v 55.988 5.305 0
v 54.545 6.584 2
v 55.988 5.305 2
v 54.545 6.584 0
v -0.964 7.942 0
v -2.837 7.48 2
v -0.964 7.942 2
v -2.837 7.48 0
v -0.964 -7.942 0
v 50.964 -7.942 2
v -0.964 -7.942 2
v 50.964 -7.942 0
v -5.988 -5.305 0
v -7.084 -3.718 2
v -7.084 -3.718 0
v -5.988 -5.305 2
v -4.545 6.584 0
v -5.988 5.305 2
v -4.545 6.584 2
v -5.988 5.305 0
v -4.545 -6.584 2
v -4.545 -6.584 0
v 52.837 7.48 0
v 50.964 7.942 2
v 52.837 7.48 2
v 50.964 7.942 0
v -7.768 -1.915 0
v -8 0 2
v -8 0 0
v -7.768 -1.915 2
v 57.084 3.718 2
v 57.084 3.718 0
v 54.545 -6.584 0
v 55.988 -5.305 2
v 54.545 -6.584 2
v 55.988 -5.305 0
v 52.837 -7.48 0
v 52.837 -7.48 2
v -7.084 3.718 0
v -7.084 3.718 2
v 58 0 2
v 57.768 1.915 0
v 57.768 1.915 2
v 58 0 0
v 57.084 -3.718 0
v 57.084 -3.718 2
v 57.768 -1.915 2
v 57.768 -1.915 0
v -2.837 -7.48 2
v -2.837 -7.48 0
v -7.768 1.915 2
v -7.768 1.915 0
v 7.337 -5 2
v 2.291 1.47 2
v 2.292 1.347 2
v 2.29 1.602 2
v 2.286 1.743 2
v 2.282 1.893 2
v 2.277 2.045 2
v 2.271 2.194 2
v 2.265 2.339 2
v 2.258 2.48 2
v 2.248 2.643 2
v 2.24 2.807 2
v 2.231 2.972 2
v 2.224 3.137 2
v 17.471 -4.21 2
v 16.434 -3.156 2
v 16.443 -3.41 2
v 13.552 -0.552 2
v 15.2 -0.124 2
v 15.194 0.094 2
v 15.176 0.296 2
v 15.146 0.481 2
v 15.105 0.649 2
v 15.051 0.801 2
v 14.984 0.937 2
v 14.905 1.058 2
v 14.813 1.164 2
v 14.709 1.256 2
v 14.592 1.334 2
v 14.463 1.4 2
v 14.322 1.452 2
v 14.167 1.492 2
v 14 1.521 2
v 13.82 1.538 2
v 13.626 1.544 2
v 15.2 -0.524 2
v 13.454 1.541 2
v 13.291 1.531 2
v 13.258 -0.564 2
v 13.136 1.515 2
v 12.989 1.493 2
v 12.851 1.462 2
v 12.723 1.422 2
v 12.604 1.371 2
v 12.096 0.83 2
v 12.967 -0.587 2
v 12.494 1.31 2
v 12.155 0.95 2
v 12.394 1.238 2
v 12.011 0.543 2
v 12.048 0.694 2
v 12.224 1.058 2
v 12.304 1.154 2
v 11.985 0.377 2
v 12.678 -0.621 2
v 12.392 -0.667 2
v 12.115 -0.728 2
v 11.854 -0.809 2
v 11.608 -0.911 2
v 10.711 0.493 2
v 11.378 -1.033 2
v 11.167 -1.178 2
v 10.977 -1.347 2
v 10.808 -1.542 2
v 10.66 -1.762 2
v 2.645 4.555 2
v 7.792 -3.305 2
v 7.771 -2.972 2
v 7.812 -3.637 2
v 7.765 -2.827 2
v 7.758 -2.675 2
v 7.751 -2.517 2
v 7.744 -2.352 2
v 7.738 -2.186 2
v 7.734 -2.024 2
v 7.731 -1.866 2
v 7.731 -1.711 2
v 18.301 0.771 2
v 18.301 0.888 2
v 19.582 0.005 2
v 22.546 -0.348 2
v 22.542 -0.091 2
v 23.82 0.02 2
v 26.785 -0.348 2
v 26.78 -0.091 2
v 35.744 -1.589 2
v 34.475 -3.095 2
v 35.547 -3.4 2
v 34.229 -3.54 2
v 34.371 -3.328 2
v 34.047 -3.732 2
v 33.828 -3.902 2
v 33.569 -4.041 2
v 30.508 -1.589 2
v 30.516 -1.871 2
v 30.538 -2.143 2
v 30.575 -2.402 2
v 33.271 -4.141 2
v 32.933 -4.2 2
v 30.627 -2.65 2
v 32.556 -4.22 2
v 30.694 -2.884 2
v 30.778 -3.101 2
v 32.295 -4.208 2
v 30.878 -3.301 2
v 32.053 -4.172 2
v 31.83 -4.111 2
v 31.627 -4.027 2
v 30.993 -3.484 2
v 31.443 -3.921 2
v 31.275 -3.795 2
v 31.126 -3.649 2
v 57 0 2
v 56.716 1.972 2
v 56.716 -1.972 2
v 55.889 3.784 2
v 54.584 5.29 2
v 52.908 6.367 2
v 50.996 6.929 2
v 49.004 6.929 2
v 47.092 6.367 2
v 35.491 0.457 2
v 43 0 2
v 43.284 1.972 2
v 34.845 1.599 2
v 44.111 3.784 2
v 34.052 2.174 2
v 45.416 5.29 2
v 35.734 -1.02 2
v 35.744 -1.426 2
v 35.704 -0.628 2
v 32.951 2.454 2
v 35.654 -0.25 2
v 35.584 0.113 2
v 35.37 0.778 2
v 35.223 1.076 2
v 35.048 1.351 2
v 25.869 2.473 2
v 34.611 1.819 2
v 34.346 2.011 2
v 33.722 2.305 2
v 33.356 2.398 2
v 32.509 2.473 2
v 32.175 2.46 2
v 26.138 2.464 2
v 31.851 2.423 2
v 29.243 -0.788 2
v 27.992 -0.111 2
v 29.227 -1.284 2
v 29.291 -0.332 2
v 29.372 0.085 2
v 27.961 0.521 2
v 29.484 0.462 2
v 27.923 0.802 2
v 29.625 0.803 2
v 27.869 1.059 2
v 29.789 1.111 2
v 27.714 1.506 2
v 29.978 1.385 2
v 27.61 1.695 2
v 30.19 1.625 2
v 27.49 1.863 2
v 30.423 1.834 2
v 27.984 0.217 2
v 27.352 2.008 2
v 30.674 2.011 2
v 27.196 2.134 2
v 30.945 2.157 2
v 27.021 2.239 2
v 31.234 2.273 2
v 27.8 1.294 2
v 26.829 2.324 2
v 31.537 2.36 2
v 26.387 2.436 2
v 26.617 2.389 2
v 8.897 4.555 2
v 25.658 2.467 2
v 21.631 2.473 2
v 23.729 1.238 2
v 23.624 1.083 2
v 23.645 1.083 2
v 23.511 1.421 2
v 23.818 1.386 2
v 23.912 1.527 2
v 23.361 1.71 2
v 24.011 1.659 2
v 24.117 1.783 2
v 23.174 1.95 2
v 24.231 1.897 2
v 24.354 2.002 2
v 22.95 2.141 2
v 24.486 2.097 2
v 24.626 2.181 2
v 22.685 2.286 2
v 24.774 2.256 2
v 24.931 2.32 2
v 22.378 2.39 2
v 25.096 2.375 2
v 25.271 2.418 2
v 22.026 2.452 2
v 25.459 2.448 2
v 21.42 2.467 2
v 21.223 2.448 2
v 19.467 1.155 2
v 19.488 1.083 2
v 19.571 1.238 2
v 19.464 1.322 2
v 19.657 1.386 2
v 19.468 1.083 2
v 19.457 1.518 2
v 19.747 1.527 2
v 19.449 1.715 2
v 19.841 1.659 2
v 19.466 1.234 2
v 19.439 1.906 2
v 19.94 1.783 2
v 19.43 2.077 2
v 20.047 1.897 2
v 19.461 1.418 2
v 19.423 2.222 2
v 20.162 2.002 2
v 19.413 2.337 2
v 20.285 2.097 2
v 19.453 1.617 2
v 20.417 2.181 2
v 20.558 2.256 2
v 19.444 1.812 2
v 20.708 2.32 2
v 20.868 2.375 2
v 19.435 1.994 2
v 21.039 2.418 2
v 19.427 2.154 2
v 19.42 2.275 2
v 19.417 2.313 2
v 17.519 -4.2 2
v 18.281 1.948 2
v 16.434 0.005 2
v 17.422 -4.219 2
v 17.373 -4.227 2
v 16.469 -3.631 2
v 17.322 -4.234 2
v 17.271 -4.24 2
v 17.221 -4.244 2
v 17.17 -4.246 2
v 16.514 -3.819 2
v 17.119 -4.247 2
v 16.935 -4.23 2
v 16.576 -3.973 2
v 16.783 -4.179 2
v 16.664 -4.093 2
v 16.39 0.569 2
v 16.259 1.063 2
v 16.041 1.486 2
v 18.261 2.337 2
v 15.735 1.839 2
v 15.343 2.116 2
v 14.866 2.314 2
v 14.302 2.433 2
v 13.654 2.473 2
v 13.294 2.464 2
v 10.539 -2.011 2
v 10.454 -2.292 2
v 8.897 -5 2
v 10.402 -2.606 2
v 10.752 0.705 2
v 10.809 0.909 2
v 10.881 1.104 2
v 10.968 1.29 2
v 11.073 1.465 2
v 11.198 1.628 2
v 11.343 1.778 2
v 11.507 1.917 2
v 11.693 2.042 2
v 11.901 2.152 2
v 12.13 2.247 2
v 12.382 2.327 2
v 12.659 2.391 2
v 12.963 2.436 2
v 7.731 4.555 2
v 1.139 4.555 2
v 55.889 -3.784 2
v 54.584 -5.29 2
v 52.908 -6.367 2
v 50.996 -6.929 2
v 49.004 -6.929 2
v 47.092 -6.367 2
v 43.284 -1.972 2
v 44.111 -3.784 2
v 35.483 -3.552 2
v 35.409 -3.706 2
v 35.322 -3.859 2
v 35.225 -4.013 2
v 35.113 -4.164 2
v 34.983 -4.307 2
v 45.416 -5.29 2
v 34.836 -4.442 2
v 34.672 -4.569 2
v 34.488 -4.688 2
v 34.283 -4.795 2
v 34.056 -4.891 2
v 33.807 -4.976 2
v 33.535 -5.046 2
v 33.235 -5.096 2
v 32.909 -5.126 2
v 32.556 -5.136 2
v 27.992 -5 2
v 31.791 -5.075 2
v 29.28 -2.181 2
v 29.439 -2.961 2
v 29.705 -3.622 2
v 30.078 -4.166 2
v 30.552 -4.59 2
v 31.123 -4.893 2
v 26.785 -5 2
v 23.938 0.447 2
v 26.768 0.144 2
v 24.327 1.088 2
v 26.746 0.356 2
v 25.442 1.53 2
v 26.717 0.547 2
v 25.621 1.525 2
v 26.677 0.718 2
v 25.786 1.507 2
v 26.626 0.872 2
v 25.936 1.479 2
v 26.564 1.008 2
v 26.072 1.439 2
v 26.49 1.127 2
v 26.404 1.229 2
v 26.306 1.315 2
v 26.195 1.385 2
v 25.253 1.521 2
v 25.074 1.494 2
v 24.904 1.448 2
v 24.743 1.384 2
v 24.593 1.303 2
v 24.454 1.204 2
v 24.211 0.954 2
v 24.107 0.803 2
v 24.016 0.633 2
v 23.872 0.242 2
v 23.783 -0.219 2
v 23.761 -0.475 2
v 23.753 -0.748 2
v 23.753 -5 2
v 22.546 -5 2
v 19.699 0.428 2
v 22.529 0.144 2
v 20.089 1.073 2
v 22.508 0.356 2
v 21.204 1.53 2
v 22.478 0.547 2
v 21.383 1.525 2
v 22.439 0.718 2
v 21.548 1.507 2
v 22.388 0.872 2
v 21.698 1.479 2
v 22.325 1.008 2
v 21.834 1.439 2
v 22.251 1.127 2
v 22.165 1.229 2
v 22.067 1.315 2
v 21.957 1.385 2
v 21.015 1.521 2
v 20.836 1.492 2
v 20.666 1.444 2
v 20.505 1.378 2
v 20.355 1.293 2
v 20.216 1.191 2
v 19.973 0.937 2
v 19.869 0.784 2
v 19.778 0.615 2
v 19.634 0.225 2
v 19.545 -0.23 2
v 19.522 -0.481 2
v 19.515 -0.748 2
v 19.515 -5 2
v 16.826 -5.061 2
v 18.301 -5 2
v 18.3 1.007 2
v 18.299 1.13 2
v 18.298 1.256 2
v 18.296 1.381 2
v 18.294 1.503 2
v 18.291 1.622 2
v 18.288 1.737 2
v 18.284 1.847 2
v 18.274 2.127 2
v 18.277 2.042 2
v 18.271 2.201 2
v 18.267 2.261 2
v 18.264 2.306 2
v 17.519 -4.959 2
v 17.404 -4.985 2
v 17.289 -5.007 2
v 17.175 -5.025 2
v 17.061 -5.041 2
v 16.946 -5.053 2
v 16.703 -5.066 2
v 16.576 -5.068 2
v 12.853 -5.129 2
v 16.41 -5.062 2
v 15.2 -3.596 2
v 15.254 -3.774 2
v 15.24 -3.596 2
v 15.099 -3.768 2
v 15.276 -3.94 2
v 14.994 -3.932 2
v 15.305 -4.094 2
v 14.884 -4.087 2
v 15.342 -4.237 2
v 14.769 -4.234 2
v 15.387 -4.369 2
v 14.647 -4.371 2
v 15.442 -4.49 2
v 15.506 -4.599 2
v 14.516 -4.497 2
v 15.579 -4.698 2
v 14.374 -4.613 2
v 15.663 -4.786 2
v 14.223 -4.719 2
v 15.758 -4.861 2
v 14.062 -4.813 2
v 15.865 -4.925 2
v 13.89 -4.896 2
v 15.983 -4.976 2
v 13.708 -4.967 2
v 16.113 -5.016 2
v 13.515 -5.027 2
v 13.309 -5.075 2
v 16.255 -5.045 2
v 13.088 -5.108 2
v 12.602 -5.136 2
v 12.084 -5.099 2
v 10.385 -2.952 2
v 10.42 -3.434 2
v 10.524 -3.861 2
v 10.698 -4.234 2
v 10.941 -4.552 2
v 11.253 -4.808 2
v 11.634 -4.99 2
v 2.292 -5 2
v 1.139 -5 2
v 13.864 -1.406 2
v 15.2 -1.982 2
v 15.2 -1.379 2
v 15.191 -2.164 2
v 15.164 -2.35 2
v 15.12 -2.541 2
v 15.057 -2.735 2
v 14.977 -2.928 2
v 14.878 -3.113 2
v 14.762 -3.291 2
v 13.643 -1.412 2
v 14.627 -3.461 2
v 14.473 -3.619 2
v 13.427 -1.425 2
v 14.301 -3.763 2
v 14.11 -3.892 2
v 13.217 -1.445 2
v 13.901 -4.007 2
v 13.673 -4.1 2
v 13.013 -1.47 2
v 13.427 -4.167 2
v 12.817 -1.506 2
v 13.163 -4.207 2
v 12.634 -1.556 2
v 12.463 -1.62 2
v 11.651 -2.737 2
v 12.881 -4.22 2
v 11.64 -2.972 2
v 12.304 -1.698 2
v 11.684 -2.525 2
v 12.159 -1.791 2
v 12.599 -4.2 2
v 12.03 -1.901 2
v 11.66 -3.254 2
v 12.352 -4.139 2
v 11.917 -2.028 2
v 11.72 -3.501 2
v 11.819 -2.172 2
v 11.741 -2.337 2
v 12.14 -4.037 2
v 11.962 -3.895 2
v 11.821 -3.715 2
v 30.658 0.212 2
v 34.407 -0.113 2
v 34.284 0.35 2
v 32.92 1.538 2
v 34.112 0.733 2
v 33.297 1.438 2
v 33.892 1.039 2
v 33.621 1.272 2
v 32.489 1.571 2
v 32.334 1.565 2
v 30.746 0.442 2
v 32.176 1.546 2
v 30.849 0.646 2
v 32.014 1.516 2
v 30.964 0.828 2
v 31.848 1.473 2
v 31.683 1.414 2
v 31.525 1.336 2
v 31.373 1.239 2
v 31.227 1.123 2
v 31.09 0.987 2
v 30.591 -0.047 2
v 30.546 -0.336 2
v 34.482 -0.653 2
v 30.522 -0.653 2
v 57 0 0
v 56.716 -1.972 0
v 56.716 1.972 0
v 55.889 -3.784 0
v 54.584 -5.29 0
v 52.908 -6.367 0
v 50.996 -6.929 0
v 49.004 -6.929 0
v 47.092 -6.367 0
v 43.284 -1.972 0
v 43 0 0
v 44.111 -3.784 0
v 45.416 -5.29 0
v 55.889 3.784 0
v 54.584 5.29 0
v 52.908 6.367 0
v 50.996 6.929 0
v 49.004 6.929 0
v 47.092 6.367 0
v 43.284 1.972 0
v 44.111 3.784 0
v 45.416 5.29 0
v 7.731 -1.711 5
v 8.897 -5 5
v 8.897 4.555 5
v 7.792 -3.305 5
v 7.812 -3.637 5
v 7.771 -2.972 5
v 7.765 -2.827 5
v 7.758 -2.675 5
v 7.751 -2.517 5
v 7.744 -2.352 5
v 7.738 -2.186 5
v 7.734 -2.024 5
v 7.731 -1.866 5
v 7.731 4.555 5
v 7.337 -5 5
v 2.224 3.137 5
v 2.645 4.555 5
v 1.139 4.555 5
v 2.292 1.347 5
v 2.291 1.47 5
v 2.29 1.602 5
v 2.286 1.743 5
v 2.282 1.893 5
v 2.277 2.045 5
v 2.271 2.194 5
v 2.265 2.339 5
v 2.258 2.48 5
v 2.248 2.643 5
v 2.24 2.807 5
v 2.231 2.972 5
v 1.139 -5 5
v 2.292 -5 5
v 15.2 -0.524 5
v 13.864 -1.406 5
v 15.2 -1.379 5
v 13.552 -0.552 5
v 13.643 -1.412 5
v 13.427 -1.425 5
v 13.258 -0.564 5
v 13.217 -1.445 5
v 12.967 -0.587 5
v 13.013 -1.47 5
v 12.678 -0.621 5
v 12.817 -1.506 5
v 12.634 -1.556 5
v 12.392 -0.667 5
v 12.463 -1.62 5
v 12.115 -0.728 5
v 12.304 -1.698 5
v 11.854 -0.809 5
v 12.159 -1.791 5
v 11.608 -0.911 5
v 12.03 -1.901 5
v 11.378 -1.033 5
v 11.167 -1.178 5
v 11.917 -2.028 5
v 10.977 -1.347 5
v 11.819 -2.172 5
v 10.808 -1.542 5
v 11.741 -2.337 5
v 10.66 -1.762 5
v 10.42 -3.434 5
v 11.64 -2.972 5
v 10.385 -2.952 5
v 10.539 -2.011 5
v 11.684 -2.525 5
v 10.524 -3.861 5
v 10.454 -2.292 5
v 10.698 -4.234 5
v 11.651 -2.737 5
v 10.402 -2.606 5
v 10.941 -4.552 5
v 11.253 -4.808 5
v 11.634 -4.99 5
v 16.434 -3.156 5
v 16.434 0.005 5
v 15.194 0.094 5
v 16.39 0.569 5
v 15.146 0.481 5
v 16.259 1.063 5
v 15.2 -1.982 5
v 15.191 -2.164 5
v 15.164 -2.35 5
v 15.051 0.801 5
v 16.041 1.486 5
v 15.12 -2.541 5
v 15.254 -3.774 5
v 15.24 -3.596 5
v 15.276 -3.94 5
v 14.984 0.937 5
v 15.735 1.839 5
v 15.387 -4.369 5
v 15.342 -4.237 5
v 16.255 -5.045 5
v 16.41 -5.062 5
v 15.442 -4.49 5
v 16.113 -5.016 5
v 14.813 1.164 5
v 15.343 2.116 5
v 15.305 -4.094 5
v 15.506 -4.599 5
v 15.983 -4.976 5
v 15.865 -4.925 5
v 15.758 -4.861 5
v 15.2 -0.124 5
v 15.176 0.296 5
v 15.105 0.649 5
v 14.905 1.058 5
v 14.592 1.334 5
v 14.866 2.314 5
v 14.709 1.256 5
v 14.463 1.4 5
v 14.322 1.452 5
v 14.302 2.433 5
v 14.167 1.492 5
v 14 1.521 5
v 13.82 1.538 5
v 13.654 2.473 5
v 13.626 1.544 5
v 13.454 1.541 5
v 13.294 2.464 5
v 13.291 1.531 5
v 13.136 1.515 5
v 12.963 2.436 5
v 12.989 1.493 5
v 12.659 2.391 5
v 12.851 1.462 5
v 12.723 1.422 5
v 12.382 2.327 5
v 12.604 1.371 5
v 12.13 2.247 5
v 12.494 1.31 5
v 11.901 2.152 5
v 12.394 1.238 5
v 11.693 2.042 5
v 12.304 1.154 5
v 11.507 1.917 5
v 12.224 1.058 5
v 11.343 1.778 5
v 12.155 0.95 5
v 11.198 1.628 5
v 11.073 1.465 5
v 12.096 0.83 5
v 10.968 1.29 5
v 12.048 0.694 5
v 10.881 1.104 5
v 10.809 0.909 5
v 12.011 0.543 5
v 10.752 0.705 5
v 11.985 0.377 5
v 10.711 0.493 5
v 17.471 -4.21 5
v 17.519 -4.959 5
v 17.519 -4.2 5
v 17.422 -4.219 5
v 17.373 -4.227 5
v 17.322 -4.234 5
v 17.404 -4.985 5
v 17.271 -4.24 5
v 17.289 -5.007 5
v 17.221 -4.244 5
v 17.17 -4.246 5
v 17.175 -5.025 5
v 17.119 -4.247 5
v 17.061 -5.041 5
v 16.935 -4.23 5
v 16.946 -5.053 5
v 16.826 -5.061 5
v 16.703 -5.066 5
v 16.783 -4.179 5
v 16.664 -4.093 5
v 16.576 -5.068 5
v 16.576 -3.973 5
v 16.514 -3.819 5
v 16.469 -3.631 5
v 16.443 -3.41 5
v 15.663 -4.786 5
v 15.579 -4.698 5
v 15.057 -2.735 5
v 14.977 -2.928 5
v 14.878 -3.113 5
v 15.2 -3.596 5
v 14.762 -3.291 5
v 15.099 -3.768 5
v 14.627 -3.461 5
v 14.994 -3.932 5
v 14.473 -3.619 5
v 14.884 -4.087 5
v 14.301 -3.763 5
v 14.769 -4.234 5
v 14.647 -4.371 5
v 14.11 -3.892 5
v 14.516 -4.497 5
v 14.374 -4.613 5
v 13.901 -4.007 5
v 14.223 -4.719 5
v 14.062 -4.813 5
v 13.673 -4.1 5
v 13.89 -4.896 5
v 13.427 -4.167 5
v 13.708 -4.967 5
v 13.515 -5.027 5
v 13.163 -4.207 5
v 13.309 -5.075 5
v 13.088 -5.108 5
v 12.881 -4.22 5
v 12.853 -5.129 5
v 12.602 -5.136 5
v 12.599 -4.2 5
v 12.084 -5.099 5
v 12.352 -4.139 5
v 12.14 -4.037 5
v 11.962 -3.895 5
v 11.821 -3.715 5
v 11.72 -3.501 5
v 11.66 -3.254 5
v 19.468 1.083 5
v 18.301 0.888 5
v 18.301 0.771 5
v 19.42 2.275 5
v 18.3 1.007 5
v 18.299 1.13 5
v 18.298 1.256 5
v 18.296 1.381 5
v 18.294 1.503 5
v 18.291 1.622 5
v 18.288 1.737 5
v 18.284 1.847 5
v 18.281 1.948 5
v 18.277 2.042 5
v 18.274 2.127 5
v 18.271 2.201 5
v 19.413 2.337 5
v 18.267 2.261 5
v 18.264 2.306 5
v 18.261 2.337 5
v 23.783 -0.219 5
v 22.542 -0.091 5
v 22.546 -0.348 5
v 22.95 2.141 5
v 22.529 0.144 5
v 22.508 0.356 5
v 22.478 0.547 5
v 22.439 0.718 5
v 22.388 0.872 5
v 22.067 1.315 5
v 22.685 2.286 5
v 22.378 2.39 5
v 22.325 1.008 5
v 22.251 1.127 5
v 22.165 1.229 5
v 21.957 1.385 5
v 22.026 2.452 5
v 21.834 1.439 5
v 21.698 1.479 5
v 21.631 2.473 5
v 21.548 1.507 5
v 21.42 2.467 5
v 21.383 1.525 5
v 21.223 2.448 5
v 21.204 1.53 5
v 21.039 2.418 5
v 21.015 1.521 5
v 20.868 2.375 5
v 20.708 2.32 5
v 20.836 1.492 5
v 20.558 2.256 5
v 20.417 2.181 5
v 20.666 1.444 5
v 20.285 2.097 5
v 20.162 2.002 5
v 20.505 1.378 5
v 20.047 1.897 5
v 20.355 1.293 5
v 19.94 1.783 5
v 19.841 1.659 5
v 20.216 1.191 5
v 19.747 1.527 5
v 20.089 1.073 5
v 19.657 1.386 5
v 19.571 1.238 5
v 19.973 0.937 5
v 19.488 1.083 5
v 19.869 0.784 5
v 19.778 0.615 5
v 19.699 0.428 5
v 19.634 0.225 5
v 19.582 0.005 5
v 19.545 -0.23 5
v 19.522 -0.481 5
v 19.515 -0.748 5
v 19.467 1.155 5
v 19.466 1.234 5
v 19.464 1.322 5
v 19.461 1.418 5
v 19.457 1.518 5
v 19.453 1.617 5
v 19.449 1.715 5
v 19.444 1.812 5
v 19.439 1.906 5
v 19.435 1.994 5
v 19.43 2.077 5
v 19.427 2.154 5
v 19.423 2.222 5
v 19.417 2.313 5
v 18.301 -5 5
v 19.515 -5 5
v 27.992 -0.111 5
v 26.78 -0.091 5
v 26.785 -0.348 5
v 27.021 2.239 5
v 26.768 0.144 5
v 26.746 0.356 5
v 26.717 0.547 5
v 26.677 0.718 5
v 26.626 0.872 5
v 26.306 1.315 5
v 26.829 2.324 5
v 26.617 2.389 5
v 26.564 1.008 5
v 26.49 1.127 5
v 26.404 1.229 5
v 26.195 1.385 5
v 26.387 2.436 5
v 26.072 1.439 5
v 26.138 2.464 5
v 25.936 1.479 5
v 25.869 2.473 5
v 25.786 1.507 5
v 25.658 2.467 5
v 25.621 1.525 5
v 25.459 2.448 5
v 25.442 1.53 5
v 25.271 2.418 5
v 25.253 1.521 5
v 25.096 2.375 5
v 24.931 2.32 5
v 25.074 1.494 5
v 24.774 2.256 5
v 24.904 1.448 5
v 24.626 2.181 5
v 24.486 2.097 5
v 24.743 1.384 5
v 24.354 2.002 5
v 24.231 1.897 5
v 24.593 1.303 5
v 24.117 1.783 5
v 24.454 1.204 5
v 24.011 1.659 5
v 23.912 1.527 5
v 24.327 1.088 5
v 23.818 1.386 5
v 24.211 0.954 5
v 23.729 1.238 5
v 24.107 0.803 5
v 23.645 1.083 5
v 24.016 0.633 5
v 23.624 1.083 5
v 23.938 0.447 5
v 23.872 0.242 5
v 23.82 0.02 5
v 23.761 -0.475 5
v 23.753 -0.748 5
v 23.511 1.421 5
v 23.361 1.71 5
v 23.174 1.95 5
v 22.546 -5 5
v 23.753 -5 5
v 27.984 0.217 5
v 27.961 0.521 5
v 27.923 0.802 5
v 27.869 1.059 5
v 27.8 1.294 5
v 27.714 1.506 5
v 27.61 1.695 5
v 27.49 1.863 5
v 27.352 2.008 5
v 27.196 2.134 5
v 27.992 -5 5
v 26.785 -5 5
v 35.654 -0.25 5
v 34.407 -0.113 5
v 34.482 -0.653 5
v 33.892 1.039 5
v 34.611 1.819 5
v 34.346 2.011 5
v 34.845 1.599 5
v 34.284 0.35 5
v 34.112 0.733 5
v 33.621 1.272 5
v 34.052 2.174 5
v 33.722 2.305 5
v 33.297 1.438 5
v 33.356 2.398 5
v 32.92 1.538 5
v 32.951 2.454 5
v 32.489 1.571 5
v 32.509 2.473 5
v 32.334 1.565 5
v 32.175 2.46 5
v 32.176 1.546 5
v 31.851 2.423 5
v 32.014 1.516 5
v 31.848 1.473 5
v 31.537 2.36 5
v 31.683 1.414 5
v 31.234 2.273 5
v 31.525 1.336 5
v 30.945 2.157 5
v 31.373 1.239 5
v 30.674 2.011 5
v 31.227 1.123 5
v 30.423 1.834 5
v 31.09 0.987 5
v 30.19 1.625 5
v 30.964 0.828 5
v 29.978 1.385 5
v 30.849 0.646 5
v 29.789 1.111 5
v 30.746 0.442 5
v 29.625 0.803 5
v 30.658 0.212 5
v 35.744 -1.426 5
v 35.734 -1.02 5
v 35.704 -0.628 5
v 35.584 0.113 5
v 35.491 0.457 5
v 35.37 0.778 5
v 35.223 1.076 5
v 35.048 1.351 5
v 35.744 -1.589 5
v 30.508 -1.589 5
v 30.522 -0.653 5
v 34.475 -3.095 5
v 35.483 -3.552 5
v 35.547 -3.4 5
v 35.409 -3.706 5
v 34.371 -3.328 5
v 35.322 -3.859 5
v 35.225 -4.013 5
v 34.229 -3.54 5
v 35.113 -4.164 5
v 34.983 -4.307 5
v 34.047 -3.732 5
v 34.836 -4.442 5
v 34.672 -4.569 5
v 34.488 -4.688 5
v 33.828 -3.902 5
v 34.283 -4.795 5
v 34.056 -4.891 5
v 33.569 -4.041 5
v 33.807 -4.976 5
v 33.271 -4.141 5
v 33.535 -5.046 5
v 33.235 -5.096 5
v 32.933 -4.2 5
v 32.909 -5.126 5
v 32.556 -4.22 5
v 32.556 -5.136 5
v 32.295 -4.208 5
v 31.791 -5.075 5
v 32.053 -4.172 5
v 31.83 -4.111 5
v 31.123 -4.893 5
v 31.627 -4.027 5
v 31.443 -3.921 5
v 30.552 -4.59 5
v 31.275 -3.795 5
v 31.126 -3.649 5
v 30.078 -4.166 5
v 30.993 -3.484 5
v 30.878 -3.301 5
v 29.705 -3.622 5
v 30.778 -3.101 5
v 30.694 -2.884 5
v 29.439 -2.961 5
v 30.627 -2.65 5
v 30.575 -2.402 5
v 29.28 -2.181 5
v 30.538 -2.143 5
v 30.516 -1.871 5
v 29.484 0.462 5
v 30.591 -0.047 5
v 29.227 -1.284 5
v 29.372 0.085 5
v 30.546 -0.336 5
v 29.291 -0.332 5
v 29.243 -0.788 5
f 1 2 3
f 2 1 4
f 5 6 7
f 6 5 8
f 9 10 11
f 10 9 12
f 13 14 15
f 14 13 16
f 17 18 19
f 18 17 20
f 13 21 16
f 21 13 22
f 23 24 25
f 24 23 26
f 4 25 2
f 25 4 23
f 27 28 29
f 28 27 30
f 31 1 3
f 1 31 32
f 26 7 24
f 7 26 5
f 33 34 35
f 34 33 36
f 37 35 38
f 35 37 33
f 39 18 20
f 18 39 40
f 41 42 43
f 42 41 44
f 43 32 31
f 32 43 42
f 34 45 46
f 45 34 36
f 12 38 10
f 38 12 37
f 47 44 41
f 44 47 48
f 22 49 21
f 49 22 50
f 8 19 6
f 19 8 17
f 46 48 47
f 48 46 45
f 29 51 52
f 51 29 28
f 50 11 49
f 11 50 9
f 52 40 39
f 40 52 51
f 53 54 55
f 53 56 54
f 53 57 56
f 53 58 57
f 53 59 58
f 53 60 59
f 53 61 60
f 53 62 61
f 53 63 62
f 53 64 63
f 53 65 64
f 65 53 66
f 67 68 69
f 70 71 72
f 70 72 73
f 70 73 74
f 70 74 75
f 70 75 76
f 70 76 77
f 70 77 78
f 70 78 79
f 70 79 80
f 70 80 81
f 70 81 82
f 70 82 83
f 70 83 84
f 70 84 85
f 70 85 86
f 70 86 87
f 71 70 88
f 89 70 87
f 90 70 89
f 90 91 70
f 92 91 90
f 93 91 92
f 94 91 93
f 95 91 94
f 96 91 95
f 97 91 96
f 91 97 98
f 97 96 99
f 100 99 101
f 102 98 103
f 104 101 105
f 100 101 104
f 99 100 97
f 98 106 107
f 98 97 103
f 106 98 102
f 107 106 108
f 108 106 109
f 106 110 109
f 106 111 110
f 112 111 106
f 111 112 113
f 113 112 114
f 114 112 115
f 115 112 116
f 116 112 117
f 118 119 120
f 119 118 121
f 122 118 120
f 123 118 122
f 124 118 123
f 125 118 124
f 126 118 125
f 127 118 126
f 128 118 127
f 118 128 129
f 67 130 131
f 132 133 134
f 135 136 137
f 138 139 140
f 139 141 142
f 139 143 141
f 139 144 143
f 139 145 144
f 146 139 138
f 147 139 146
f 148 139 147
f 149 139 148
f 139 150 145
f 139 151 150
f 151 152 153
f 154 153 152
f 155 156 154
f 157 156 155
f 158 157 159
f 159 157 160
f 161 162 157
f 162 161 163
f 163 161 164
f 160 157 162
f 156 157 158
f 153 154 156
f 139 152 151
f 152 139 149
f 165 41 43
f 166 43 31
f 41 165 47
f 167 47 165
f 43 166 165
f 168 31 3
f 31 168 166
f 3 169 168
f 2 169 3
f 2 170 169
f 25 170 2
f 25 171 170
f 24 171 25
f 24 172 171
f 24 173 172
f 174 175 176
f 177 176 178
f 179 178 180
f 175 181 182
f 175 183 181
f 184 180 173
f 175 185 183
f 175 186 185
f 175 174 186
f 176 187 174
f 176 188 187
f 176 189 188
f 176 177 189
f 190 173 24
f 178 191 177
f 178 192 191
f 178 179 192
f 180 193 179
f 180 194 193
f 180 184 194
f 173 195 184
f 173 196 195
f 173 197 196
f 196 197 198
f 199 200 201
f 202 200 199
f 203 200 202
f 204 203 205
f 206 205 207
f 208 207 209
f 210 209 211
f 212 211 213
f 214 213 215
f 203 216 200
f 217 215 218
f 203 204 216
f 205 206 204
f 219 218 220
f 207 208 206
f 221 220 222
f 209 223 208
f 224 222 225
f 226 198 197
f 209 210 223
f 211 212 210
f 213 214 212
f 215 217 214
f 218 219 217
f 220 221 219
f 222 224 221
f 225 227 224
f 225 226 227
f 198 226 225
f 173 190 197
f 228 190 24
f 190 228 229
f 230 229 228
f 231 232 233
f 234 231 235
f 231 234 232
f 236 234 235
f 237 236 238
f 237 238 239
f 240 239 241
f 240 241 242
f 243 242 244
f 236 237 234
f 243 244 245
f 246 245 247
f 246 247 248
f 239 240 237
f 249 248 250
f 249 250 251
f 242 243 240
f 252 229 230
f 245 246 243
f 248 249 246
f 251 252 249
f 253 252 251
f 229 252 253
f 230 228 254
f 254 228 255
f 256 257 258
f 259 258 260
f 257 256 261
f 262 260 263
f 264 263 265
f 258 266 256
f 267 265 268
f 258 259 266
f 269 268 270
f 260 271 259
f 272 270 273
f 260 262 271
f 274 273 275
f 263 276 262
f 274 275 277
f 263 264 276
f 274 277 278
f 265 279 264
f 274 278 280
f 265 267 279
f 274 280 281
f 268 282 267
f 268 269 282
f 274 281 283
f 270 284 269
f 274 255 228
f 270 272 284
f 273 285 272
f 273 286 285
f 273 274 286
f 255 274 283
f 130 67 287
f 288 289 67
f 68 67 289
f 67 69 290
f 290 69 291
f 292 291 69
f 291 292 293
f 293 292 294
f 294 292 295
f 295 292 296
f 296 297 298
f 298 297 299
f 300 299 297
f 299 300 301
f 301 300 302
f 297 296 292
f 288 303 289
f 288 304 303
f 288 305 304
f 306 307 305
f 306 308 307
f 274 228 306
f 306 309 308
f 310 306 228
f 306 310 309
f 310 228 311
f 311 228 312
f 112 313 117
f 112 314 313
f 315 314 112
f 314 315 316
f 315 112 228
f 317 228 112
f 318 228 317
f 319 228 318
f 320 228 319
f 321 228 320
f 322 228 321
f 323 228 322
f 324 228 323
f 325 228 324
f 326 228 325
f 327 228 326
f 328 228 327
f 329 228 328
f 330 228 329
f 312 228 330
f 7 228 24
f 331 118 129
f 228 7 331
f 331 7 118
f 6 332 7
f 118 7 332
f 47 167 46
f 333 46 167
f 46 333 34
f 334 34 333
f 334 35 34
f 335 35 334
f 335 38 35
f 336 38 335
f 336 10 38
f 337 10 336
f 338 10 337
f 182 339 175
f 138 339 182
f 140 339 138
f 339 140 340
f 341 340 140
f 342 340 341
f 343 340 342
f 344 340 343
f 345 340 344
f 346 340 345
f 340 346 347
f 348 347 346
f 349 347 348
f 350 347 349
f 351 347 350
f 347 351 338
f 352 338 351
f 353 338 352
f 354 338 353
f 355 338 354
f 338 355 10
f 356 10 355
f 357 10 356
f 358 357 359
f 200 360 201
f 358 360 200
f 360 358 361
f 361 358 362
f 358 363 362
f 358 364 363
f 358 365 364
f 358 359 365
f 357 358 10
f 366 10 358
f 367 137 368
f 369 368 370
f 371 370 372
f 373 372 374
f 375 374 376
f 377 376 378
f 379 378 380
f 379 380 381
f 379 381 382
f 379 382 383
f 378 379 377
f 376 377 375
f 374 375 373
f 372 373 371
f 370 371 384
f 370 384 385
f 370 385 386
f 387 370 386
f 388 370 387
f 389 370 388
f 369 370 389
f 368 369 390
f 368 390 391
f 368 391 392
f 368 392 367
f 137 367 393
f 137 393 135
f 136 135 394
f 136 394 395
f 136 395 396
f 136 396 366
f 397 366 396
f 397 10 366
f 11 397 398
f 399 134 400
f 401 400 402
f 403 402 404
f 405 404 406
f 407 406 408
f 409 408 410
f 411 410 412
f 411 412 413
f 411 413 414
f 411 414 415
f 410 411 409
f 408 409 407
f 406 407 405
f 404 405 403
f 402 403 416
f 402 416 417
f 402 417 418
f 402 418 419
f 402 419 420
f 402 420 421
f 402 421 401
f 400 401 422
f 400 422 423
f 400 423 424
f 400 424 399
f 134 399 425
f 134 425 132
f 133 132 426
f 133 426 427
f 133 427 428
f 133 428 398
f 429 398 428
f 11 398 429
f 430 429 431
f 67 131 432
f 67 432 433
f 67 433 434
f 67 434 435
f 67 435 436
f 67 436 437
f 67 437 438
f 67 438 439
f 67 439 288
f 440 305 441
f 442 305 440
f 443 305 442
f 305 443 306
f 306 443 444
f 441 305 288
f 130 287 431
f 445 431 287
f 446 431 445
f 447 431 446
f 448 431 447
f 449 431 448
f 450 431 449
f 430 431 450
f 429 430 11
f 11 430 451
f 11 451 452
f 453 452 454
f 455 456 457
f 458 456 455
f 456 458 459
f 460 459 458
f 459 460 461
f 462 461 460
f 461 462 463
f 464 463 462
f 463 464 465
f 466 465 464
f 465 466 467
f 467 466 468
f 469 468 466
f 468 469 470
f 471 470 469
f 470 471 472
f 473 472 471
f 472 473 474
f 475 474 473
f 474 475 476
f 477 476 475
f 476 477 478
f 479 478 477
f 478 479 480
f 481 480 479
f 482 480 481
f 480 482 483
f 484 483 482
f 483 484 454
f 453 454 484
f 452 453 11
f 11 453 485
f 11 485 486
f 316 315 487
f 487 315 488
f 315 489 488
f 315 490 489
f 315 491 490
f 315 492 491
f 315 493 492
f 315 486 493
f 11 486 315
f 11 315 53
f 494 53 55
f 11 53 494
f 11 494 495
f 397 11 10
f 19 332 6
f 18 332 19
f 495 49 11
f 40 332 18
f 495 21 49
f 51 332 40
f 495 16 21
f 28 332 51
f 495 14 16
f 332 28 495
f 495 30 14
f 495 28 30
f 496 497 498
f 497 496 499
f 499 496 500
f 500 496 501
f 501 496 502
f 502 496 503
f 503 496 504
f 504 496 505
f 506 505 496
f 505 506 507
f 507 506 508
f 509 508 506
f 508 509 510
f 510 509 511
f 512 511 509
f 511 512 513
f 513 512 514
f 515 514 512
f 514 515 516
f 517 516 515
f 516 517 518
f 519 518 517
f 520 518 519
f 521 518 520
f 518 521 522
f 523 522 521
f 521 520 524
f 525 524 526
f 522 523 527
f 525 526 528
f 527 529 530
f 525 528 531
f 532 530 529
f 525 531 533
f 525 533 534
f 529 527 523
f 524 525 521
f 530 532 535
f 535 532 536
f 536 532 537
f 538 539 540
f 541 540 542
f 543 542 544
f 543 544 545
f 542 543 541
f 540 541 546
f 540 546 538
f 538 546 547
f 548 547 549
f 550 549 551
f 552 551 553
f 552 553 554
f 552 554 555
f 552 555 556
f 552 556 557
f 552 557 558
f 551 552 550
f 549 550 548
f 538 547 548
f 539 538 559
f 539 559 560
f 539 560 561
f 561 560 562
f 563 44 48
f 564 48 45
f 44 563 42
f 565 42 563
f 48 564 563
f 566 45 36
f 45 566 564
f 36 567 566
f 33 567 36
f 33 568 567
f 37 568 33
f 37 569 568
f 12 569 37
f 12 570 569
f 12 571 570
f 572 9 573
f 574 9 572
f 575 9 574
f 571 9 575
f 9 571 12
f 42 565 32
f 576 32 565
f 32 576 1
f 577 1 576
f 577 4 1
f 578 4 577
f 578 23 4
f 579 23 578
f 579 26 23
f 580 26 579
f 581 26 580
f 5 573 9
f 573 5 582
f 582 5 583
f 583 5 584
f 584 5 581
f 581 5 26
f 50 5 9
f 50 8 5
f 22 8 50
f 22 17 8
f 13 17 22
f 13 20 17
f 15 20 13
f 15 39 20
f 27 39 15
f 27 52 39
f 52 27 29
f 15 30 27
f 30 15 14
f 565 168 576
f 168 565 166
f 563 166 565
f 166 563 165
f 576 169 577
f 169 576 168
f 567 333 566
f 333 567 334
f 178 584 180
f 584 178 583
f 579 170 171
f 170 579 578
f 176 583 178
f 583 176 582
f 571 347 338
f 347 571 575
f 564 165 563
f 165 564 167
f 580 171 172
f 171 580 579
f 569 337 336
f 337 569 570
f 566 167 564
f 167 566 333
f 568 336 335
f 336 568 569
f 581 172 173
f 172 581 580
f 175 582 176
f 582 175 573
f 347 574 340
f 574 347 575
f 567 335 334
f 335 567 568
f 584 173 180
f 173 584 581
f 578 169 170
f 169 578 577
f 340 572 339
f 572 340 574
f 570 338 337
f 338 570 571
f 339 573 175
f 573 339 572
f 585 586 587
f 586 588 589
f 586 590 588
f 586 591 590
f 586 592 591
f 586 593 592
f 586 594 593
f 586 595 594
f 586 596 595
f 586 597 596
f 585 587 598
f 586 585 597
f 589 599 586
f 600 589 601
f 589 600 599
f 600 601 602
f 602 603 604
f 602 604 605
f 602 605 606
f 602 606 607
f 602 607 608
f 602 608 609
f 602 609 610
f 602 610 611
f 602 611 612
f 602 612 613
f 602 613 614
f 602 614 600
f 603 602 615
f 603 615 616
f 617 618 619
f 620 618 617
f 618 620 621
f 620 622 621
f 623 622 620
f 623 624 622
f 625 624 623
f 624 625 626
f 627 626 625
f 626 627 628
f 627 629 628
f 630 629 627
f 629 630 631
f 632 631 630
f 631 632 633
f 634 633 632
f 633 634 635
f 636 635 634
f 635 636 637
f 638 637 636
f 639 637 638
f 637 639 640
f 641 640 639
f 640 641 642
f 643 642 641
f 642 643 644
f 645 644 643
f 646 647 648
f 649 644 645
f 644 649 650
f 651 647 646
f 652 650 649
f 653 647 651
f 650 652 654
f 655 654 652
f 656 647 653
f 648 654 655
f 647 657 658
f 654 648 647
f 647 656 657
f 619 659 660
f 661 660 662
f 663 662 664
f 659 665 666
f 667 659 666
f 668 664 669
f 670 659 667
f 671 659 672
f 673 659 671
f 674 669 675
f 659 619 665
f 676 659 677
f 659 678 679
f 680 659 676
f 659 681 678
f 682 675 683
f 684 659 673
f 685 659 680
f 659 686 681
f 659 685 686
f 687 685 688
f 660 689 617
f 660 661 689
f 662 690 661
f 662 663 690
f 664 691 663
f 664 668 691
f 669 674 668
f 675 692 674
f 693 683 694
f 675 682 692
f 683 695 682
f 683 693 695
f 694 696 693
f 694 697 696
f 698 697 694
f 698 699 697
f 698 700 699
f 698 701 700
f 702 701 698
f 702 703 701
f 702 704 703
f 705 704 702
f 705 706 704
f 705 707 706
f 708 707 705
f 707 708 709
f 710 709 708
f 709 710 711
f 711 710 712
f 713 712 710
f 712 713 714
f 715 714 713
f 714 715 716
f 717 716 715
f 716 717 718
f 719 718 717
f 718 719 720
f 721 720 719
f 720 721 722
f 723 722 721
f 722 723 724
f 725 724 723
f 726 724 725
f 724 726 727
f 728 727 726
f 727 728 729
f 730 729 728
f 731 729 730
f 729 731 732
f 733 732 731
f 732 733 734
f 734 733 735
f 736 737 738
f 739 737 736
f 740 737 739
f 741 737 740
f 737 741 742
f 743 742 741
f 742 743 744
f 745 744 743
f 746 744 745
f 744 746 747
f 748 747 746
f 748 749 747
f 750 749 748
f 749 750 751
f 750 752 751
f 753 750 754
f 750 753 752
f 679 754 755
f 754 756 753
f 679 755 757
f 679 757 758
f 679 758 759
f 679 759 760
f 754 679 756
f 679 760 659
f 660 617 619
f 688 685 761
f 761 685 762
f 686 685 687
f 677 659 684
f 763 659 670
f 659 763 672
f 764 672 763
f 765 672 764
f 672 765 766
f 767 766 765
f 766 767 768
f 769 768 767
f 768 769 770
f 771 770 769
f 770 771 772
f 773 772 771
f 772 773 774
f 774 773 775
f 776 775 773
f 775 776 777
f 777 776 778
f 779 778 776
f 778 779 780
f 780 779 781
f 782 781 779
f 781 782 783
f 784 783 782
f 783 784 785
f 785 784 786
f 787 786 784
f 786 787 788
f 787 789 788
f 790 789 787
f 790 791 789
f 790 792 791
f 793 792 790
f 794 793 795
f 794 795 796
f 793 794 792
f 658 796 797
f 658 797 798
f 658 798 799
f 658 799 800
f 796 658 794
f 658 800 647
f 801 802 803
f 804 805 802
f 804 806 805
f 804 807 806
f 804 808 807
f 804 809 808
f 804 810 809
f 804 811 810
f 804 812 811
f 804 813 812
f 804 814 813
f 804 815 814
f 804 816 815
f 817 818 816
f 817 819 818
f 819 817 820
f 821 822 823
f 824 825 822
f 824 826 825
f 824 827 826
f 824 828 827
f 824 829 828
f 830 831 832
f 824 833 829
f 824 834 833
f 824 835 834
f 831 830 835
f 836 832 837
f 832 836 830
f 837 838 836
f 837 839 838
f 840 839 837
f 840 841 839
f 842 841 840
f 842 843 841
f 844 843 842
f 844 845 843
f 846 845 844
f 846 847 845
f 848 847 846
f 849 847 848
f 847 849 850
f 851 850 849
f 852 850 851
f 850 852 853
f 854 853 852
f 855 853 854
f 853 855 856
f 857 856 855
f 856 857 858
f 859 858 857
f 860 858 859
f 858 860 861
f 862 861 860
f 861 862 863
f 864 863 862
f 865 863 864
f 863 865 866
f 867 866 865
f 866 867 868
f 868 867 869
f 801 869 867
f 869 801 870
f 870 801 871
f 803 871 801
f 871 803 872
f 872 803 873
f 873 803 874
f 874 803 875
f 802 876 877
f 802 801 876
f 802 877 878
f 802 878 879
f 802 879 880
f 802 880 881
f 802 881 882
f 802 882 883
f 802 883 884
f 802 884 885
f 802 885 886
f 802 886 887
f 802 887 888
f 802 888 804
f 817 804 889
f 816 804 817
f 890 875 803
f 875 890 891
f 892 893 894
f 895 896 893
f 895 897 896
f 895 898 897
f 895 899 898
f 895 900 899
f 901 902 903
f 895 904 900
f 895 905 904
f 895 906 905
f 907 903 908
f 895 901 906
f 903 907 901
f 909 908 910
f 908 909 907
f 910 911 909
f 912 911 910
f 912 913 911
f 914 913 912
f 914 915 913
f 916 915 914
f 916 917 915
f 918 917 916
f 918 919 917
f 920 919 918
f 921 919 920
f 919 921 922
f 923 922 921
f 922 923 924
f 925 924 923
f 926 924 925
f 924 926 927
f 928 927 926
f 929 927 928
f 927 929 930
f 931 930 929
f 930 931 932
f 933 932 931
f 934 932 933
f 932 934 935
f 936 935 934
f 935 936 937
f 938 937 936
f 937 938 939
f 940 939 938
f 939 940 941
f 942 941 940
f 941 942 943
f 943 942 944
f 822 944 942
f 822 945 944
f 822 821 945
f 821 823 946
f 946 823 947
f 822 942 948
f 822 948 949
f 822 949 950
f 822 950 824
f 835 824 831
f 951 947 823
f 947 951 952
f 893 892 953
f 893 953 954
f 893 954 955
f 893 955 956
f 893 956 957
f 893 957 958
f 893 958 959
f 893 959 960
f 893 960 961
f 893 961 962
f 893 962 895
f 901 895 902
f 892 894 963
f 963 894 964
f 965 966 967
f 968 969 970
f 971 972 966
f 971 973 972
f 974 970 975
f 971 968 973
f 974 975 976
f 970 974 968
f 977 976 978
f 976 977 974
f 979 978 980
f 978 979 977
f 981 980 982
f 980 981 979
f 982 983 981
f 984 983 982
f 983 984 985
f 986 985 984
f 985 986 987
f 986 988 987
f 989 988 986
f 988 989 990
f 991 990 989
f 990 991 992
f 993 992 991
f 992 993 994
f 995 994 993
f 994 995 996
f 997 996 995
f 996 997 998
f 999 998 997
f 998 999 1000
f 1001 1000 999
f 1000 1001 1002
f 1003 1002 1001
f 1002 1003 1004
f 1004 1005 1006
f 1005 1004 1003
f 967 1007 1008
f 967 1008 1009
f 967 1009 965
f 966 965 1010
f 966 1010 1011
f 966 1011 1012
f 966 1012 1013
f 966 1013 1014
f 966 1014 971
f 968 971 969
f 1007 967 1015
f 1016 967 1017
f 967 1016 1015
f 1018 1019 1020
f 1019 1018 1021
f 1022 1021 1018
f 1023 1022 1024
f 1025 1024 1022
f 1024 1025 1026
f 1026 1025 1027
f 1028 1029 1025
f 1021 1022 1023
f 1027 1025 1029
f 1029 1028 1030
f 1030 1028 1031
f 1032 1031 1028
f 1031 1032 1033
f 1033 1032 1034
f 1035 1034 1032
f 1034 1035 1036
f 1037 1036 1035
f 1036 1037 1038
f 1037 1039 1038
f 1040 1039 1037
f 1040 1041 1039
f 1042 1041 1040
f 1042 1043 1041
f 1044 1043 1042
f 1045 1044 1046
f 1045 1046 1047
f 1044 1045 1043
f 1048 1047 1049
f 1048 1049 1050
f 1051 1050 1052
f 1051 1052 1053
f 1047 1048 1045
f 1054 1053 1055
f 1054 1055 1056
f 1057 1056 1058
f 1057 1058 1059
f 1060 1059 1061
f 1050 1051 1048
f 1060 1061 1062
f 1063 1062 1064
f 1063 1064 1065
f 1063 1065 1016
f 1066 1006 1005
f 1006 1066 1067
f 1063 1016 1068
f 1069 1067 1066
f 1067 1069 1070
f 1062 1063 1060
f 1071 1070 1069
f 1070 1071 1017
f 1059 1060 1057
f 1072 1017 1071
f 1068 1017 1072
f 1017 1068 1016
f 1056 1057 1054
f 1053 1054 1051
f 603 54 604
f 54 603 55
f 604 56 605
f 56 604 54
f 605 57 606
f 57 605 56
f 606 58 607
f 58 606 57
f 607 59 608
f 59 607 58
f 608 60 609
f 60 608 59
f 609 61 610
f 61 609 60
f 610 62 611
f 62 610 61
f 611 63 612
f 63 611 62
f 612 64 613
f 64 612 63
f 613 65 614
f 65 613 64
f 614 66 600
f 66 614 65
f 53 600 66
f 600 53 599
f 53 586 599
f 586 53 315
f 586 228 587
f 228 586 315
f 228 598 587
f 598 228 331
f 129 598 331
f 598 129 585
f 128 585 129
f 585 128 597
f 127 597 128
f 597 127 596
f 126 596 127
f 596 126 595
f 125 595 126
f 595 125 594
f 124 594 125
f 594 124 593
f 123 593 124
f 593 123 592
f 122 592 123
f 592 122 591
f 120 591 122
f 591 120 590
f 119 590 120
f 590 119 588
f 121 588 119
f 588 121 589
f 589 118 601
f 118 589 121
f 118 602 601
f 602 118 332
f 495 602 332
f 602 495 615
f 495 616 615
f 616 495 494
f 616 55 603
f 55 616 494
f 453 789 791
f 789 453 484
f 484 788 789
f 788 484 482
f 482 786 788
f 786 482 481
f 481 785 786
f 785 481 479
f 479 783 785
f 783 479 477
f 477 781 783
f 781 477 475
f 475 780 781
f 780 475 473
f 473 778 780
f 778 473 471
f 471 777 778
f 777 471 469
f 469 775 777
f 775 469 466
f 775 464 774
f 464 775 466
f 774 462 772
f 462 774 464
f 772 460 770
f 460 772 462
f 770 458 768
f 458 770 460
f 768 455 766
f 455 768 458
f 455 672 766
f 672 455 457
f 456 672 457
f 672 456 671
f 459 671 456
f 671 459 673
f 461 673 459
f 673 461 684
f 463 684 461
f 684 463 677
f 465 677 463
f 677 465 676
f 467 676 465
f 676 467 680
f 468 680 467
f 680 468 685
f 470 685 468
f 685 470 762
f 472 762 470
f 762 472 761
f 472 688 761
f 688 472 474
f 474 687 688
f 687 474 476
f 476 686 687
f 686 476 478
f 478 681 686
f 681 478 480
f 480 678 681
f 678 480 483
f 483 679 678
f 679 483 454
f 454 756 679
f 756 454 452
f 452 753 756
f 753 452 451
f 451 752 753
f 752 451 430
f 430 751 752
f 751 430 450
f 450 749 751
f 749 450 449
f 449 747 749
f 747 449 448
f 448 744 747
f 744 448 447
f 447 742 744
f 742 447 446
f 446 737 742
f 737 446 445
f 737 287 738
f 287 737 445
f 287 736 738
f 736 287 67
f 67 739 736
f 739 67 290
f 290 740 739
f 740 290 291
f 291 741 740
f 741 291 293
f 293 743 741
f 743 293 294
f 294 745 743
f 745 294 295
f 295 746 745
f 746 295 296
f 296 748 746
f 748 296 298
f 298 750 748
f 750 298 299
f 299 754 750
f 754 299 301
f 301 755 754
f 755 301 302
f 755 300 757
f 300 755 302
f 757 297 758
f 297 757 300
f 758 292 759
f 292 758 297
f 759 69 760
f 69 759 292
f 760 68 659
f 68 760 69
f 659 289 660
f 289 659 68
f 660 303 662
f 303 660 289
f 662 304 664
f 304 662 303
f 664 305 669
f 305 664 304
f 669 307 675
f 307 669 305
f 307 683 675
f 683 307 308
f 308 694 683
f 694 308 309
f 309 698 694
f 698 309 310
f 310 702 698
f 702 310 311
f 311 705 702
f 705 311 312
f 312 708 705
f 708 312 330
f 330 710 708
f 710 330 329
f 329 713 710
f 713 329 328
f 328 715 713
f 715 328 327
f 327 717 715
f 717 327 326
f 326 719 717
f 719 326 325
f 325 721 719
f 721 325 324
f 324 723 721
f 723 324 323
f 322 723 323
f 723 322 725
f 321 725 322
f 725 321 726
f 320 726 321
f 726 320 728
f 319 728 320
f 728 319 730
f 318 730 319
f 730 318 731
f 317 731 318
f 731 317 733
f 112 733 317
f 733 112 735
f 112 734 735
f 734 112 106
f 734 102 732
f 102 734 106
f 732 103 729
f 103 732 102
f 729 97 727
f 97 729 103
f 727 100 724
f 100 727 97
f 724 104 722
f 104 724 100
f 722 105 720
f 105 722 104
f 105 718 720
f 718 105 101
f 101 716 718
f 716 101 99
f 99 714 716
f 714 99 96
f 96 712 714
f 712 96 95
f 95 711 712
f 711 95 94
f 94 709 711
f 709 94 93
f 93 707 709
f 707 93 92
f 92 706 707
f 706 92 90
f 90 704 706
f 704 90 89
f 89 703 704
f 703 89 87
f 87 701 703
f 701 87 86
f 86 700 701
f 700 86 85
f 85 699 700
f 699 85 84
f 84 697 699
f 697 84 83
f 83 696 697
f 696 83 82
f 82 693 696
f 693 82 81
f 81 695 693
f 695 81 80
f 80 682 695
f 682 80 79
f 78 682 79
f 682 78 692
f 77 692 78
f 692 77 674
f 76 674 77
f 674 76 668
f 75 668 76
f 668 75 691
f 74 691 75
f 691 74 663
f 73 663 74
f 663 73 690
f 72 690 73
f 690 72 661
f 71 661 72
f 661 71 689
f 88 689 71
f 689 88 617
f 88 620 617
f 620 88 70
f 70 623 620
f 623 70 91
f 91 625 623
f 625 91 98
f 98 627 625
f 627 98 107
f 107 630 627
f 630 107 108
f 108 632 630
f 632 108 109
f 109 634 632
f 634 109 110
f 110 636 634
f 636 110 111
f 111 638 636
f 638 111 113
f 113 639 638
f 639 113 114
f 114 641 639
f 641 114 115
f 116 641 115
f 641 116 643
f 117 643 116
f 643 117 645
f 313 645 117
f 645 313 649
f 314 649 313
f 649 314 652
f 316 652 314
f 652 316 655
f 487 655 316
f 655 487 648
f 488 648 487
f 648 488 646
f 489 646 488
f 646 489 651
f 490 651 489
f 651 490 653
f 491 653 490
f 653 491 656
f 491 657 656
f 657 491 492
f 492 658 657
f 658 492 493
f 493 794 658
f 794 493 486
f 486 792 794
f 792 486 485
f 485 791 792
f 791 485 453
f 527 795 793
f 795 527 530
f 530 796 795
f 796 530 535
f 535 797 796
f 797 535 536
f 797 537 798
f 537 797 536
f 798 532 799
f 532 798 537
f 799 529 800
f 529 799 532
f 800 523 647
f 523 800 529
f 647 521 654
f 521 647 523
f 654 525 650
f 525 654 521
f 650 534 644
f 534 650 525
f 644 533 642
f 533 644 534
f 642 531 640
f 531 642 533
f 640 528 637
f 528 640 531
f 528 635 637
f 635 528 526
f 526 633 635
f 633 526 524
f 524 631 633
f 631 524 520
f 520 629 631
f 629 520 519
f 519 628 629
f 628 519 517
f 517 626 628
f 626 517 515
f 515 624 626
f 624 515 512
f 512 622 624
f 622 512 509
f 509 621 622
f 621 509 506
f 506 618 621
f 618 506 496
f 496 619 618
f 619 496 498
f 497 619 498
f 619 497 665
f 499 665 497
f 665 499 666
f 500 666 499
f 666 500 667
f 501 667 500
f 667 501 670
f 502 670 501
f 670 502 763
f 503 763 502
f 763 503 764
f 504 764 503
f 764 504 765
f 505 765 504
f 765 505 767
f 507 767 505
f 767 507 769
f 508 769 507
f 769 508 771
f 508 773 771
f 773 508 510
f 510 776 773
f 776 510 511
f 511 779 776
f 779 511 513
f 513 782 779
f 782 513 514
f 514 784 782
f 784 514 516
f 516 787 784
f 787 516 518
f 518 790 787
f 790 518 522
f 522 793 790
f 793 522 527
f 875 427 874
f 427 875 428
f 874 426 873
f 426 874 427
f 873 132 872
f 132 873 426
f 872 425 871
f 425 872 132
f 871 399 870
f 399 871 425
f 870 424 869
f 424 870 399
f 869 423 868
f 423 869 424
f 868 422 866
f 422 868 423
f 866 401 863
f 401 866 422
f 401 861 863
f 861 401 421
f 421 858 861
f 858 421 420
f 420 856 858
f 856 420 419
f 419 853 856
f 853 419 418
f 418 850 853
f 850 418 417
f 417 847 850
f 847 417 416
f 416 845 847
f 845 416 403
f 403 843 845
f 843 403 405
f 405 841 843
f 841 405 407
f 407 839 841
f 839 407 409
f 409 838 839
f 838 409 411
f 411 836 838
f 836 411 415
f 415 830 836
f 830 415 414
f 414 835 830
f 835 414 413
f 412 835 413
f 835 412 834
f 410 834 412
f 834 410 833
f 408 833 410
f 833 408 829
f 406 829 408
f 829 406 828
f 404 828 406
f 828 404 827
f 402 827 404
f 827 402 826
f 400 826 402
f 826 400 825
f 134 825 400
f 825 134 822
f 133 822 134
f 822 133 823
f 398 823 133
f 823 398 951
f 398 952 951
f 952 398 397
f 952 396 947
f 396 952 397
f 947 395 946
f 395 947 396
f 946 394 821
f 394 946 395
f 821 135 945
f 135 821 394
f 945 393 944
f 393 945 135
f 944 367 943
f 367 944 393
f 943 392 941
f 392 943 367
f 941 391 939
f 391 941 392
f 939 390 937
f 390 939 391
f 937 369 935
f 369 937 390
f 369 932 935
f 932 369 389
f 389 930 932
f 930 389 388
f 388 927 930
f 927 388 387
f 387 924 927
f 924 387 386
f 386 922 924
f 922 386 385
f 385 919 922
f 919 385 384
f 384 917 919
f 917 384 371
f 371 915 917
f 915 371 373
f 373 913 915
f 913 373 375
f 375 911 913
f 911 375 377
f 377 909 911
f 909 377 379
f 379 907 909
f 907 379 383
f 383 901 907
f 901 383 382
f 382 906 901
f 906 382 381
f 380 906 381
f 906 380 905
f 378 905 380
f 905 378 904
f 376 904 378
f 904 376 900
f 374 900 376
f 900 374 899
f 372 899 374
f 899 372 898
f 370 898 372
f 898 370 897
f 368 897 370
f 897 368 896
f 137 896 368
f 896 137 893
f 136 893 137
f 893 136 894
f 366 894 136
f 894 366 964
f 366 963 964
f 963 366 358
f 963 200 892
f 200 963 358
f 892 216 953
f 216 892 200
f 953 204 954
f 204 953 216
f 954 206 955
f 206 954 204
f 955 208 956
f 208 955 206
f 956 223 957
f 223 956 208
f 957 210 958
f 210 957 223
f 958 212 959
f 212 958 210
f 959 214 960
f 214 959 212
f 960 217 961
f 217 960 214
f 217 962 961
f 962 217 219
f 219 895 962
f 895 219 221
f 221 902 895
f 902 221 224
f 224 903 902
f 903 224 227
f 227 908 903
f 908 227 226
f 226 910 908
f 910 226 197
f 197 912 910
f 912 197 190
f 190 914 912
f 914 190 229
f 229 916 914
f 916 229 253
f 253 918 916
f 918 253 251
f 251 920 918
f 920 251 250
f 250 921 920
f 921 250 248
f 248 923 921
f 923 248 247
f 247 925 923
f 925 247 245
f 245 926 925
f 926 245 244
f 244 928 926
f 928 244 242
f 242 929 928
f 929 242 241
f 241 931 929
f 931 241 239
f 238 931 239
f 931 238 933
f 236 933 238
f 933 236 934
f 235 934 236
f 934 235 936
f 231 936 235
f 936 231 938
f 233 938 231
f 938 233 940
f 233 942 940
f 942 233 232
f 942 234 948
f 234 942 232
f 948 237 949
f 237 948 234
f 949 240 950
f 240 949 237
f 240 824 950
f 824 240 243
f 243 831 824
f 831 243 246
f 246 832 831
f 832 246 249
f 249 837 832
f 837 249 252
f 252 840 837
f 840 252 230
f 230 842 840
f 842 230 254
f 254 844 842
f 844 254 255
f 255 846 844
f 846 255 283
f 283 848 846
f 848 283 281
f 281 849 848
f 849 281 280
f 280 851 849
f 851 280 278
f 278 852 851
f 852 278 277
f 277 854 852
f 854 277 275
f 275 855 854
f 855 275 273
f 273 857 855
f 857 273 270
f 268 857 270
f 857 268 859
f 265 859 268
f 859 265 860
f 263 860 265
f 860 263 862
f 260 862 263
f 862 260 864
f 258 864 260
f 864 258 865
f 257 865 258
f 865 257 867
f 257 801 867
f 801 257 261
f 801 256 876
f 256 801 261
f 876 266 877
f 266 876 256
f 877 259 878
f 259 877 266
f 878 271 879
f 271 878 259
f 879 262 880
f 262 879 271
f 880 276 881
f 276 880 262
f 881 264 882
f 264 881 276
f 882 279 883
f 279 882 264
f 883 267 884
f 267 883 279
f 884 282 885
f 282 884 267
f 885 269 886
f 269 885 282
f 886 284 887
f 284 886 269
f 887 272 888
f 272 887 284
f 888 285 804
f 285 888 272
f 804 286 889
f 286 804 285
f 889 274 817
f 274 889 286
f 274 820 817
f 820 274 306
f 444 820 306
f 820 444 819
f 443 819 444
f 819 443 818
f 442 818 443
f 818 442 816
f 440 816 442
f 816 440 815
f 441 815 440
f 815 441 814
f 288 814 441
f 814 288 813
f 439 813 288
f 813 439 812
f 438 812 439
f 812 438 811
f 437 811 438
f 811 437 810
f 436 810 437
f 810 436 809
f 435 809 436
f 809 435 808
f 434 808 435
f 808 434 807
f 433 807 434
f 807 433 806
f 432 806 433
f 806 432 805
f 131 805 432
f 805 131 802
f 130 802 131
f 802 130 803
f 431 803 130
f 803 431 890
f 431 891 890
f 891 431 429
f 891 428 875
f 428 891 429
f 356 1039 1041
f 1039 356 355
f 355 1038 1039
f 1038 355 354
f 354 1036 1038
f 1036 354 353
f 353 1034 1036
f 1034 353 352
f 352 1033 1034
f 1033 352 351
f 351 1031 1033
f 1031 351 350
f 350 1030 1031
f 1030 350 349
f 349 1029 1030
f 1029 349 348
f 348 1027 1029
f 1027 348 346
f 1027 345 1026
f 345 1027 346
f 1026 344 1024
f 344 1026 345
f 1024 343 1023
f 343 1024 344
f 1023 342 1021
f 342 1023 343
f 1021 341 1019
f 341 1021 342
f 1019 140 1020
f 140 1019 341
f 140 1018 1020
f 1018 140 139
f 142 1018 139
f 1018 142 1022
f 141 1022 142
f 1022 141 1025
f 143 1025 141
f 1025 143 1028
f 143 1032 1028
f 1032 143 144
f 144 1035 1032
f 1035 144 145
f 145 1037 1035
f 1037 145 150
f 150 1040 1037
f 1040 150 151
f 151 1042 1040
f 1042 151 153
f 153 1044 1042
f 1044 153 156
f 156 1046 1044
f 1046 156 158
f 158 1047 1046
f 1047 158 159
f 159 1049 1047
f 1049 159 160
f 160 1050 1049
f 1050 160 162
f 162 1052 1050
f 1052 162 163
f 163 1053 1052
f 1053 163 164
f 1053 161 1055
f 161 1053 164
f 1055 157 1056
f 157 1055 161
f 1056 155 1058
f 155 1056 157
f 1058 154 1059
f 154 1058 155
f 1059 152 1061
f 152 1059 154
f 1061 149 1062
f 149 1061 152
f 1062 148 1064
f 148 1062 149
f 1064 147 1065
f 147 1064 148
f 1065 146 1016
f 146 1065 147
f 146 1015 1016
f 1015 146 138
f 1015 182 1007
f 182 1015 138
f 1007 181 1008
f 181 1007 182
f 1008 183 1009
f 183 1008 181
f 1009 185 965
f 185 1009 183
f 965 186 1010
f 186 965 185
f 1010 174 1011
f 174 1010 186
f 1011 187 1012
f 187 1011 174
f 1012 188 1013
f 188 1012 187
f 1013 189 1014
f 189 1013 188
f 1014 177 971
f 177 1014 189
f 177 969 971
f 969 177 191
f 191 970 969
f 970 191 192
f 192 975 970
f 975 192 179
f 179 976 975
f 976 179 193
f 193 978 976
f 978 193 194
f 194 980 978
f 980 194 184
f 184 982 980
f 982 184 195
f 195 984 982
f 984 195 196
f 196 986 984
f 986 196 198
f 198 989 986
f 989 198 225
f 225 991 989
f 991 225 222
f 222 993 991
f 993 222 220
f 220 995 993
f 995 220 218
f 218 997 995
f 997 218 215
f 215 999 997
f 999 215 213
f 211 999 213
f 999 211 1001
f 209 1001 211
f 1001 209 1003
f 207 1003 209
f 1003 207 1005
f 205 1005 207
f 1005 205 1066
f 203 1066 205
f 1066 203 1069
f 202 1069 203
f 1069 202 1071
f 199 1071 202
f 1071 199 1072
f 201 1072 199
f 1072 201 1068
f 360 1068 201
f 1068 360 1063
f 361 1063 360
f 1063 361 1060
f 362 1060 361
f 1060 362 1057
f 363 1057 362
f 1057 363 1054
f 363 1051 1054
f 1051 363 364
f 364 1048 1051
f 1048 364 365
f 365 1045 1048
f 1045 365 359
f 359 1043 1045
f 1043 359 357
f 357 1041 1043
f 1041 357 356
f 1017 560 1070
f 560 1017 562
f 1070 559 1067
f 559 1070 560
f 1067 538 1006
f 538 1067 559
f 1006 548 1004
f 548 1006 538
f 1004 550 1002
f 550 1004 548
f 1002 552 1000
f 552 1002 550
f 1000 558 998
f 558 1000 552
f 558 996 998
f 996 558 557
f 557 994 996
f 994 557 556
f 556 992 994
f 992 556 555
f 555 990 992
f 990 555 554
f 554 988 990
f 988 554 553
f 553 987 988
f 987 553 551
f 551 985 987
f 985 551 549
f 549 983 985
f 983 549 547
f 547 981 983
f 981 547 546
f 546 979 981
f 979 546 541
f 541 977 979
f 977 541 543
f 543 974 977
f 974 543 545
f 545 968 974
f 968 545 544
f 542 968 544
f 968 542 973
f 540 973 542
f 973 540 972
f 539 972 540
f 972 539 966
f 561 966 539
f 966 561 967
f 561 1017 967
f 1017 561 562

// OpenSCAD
//Name Tag - Customizable
Name = "Name";
Lenght = 50;

linear_extrude(height = 5)
translate([0, -5, 0])
text(Name);

difference(){
    hull(){
        cylinder(h=2,d=16);
        translate([Lenght,0,0])
        cylinder(h=2,d=16);
    }
    translate([Lenght,0,0])
    cylinder(h=2,d=14);

}
